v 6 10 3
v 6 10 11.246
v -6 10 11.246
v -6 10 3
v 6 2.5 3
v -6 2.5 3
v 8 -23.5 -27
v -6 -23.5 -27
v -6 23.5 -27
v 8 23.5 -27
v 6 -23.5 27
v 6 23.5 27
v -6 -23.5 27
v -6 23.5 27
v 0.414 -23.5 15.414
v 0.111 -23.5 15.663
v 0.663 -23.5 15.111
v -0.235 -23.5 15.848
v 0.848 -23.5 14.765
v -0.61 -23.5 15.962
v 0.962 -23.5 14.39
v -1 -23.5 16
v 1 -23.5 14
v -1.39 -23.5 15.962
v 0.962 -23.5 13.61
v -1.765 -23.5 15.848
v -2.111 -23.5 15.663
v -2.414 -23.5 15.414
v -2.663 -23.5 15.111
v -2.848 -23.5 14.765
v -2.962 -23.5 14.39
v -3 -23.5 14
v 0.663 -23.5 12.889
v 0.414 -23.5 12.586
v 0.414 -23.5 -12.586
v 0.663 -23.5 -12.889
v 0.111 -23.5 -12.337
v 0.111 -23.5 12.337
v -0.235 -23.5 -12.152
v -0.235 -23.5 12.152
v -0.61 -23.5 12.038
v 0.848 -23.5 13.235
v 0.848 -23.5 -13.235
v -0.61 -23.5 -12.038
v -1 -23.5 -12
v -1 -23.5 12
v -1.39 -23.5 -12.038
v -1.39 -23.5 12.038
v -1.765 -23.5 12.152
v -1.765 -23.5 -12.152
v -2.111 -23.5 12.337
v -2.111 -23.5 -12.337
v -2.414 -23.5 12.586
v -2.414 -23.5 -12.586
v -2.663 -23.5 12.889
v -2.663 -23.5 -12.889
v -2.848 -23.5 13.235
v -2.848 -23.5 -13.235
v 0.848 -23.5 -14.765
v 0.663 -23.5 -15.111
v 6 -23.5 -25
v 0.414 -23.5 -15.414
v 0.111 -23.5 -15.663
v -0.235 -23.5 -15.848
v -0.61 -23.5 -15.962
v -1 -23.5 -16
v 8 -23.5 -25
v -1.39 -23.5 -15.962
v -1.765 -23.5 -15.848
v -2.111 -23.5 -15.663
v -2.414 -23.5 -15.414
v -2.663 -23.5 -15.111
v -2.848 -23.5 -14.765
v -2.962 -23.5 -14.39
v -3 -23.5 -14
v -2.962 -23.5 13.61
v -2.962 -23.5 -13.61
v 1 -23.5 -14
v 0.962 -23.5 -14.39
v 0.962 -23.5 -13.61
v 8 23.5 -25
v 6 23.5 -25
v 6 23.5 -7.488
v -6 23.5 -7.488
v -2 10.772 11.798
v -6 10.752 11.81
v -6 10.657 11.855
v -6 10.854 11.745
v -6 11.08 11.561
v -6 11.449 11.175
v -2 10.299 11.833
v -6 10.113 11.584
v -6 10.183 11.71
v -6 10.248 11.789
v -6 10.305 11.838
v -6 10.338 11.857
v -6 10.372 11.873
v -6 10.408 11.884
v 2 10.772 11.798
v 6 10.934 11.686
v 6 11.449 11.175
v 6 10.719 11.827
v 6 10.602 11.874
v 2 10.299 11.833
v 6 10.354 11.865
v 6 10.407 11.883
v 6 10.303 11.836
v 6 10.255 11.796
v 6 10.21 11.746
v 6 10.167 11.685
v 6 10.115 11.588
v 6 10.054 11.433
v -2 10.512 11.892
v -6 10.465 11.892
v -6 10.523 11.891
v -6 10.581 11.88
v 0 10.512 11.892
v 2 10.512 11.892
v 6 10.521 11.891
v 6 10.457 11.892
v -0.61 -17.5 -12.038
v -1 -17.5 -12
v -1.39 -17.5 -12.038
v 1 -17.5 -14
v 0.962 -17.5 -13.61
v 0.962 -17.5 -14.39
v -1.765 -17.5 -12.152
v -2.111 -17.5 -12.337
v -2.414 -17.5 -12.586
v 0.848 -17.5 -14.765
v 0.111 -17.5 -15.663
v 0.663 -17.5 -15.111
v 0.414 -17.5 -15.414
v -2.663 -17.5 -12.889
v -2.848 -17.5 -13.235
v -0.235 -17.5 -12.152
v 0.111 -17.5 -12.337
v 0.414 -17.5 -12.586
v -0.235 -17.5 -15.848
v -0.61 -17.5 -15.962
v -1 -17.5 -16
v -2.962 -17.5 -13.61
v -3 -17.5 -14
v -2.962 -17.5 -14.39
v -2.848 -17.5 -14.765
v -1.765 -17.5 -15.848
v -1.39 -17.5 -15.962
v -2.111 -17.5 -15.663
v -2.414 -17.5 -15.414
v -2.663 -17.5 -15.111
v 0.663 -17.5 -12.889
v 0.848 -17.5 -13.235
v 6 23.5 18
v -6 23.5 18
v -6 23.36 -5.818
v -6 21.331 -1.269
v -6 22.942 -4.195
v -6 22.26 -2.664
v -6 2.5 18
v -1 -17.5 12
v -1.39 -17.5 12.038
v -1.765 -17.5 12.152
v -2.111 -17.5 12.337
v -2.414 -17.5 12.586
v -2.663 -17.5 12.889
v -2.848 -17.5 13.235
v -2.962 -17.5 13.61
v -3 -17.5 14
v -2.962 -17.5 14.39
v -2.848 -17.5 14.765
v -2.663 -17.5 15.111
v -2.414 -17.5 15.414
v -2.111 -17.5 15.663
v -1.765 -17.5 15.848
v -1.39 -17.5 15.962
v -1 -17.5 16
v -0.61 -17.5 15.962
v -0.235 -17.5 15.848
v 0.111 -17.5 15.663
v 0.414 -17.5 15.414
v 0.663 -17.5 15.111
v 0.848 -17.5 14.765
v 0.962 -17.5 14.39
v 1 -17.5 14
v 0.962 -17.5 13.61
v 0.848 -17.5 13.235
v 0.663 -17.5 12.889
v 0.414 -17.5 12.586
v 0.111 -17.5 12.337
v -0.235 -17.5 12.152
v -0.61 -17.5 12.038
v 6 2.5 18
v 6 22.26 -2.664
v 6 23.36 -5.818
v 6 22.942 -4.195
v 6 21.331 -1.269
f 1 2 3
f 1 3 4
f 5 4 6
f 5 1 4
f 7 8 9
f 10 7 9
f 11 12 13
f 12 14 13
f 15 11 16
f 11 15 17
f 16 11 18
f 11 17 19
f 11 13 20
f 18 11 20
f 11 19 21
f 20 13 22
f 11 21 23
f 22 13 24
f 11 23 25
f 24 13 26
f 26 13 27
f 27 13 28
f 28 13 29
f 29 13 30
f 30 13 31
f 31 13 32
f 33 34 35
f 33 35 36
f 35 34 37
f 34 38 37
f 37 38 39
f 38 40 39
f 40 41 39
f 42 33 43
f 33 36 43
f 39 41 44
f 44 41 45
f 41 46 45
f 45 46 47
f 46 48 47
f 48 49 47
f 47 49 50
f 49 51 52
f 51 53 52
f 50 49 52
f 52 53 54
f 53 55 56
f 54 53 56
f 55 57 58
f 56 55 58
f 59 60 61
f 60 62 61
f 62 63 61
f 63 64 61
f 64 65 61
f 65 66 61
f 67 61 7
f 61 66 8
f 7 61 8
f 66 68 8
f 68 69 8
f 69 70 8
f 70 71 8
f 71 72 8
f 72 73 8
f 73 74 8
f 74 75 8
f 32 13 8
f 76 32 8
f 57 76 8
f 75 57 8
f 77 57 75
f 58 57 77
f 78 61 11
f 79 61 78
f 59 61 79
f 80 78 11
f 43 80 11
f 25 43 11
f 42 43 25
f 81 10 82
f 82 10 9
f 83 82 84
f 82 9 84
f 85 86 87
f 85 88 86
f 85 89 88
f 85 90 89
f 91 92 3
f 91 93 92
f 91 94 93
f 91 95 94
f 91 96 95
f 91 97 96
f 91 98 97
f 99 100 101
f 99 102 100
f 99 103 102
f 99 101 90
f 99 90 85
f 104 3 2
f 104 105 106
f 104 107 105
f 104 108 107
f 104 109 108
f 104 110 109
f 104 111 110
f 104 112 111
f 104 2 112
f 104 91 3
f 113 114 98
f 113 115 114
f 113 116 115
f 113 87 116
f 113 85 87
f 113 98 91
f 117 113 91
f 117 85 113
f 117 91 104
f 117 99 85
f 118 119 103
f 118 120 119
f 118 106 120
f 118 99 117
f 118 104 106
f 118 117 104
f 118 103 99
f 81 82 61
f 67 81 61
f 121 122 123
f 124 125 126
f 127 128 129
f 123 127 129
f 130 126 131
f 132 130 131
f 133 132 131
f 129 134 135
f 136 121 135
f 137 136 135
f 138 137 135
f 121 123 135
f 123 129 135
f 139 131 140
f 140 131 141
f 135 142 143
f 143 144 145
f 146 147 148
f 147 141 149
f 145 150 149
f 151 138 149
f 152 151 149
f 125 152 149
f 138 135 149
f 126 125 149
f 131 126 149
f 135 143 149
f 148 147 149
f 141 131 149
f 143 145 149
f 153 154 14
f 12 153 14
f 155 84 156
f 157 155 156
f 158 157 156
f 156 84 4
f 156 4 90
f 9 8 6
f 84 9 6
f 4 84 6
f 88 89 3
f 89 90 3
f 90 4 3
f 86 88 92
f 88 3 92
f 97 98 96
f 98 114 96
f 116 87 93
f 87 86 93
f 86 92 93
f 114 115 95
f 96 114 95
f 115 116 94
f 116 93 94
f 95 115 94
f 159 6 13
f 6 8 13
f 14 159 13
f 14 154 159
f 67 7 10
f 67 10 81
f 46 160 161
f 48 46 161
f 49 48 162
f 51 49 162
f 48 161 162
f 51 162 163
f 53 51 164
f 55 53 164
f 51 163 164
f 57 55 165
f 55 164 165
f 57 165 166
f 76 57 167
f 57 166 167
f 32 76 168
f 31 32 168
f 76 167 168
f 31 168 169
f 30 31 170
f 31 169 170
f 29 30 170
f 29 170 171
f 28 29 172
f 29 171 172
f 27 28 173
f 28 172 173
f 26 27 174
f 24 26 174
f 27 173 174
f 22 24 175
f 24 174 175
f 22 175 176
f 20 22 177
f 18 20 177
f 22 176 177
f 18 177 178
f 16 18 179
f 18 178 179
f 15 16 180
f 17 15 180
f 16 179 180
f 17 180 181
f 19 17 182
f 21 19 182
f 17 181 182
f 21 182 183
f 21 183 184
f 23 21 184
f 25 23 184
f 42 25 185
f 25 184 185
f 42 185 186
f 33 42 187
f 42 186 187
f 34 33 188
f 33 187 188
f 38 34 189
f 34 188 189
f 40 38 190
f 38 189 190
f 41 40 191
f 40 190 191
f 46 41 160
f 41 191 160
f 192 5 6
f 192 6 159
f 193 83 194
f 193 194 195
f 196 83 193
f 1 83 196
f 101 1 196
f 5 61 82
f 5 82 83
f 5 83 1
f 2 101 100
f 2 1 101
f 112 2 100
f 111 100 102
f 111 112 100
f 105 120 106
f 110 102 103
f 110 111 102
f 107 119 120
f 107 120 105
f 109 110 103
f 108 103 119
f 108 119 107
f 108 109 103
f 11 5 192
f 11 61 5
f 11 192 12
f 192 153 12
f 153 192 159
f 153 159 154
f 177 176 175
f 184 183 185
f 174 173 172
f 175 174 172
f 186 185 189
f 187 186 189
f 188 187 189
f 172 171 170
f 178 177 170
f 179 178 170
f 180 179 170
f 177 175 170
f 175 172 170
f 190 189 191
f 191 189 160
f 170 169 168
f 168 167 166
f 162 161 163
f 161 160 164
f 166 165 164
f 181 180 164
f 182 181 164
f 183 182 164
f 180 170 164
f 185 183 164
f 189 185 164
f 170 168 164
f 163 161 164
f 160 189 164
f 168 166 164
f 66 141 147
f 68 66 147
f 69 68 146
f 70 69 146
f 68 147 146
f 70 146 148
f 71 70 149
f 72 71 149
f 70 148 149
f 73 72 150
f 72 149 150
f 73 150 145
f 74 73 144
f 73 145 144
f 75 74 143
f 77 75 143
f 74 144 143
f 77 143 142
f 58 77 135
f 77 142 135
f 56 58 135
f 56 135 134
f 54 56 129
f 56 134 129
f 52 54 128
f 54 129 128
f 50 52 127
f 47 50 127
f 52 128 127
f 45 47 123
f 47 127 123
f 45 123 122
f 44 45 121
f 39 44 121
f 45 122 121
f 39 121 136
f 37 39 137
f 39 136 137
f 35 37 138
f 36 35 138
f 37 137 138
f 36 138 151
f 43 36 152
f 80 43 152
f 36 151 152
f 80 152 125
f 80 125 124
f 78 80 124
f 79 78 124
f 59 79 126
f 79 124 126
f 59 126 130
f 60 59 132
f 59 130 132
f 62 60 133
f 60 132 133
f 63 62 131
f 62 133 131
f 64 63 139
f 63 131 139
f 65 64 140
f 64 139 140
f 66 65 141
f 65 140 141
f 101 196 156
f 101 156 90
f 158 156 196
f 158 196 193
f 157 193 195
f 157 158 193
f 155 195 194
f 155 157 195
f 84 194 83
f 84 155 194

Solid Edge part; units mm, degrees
sketch "Sketch1" plane through (0, 0, 0) normal (1, 0, 0) x (0, 1, 0)
  line L0 (-23.5, -27) -> (23.5, -27)
  line L1 (23.5, -27) -> (23.5, 27)
  line L2 (23.5, 27) -> (-23.5, 27)
  line L3 (-23.5, 27) -> (-23.5, -27)
  dimension "D1" = 54
  dimension "D2" = 47
extrude "Protrusion1" add sketch "Sketch1" along normal mid plane 12
hole "Bohrung_1" at (-1, -23.5, 14) direction (0, 1, 0) diameter 4 depth 6
hole "Hole1" at (-1, -23.5, -14) direction (0, 1, 0) diameter 4 depth 6
sketch "Sketch2" plane through (6, 0, 0) normal (1, 0, 0) x (0, 1, 0)
  line L0 (23.5, -4) -> (10, 13)
  line L1 (10, 13) -> (10, 3)
  line L2 (10, 3) -> (2.5, 3)
  line L3 (2.5, 3) -> (2.5, 18)
  line L4 (2.5, 18) -> (23.5, 18)
  line L5 (23.5, 18) -> (23.5, -4)
  dimension "D1" = 21
  dimension "D2" = 7.5
  dimension "D3" = 10
  dimension "D4" = 15
  dimension "D5" = 23
  dimension "D6" = 30
extrude "Extrusionsausschnitt_1" cut sketch "Sketch2" against normal blind 135.5146
sketch "Sketch3" plane through (6, 0, 0) normal (1, 0, 0) x (0, 1, 0)
  spline S0 degree 3 poles (12.1174, 10.3337) (10.891, 11.9811) (10.2801, 12.3852) (10, 11.2459) knots 0 0 0 0 1 1 1 1
  line L0 (9.0244, 13.5703) -> (10, 11.2459)
  line L1 (12.1174, 14.0202) -> (9.0244, 13.5703)
  line L2 (12.1174, 10.3337) -> (12.1174, 14.0202)
extrude "Extrusionsausschnitt_3" cut sketch "Sketch3" along normal mid plane 89.7467
fillet "Verrundung_1" radius 10 1 edges at (0, 23.5, -4)
sketch "Sketch4" plane through (6, 0, 0) normal (1, 0, 0) x (0, 1, 0)
  line L0 (-23.5, -27) -> (23.5, -27)
  line L1 (23.5, -27) -> (23.5, -25)
  line L2 (23.5, -25) -> (-23.5, -25)
  line L3 (-23.5, -25) -> (-23.5, -27)
  dimension "D1" = 2
extrude "Extrusionsausprägung_5" add sketch "Sketch4" along normal blind 2
properties part number "40" material "Polyacticacid"
